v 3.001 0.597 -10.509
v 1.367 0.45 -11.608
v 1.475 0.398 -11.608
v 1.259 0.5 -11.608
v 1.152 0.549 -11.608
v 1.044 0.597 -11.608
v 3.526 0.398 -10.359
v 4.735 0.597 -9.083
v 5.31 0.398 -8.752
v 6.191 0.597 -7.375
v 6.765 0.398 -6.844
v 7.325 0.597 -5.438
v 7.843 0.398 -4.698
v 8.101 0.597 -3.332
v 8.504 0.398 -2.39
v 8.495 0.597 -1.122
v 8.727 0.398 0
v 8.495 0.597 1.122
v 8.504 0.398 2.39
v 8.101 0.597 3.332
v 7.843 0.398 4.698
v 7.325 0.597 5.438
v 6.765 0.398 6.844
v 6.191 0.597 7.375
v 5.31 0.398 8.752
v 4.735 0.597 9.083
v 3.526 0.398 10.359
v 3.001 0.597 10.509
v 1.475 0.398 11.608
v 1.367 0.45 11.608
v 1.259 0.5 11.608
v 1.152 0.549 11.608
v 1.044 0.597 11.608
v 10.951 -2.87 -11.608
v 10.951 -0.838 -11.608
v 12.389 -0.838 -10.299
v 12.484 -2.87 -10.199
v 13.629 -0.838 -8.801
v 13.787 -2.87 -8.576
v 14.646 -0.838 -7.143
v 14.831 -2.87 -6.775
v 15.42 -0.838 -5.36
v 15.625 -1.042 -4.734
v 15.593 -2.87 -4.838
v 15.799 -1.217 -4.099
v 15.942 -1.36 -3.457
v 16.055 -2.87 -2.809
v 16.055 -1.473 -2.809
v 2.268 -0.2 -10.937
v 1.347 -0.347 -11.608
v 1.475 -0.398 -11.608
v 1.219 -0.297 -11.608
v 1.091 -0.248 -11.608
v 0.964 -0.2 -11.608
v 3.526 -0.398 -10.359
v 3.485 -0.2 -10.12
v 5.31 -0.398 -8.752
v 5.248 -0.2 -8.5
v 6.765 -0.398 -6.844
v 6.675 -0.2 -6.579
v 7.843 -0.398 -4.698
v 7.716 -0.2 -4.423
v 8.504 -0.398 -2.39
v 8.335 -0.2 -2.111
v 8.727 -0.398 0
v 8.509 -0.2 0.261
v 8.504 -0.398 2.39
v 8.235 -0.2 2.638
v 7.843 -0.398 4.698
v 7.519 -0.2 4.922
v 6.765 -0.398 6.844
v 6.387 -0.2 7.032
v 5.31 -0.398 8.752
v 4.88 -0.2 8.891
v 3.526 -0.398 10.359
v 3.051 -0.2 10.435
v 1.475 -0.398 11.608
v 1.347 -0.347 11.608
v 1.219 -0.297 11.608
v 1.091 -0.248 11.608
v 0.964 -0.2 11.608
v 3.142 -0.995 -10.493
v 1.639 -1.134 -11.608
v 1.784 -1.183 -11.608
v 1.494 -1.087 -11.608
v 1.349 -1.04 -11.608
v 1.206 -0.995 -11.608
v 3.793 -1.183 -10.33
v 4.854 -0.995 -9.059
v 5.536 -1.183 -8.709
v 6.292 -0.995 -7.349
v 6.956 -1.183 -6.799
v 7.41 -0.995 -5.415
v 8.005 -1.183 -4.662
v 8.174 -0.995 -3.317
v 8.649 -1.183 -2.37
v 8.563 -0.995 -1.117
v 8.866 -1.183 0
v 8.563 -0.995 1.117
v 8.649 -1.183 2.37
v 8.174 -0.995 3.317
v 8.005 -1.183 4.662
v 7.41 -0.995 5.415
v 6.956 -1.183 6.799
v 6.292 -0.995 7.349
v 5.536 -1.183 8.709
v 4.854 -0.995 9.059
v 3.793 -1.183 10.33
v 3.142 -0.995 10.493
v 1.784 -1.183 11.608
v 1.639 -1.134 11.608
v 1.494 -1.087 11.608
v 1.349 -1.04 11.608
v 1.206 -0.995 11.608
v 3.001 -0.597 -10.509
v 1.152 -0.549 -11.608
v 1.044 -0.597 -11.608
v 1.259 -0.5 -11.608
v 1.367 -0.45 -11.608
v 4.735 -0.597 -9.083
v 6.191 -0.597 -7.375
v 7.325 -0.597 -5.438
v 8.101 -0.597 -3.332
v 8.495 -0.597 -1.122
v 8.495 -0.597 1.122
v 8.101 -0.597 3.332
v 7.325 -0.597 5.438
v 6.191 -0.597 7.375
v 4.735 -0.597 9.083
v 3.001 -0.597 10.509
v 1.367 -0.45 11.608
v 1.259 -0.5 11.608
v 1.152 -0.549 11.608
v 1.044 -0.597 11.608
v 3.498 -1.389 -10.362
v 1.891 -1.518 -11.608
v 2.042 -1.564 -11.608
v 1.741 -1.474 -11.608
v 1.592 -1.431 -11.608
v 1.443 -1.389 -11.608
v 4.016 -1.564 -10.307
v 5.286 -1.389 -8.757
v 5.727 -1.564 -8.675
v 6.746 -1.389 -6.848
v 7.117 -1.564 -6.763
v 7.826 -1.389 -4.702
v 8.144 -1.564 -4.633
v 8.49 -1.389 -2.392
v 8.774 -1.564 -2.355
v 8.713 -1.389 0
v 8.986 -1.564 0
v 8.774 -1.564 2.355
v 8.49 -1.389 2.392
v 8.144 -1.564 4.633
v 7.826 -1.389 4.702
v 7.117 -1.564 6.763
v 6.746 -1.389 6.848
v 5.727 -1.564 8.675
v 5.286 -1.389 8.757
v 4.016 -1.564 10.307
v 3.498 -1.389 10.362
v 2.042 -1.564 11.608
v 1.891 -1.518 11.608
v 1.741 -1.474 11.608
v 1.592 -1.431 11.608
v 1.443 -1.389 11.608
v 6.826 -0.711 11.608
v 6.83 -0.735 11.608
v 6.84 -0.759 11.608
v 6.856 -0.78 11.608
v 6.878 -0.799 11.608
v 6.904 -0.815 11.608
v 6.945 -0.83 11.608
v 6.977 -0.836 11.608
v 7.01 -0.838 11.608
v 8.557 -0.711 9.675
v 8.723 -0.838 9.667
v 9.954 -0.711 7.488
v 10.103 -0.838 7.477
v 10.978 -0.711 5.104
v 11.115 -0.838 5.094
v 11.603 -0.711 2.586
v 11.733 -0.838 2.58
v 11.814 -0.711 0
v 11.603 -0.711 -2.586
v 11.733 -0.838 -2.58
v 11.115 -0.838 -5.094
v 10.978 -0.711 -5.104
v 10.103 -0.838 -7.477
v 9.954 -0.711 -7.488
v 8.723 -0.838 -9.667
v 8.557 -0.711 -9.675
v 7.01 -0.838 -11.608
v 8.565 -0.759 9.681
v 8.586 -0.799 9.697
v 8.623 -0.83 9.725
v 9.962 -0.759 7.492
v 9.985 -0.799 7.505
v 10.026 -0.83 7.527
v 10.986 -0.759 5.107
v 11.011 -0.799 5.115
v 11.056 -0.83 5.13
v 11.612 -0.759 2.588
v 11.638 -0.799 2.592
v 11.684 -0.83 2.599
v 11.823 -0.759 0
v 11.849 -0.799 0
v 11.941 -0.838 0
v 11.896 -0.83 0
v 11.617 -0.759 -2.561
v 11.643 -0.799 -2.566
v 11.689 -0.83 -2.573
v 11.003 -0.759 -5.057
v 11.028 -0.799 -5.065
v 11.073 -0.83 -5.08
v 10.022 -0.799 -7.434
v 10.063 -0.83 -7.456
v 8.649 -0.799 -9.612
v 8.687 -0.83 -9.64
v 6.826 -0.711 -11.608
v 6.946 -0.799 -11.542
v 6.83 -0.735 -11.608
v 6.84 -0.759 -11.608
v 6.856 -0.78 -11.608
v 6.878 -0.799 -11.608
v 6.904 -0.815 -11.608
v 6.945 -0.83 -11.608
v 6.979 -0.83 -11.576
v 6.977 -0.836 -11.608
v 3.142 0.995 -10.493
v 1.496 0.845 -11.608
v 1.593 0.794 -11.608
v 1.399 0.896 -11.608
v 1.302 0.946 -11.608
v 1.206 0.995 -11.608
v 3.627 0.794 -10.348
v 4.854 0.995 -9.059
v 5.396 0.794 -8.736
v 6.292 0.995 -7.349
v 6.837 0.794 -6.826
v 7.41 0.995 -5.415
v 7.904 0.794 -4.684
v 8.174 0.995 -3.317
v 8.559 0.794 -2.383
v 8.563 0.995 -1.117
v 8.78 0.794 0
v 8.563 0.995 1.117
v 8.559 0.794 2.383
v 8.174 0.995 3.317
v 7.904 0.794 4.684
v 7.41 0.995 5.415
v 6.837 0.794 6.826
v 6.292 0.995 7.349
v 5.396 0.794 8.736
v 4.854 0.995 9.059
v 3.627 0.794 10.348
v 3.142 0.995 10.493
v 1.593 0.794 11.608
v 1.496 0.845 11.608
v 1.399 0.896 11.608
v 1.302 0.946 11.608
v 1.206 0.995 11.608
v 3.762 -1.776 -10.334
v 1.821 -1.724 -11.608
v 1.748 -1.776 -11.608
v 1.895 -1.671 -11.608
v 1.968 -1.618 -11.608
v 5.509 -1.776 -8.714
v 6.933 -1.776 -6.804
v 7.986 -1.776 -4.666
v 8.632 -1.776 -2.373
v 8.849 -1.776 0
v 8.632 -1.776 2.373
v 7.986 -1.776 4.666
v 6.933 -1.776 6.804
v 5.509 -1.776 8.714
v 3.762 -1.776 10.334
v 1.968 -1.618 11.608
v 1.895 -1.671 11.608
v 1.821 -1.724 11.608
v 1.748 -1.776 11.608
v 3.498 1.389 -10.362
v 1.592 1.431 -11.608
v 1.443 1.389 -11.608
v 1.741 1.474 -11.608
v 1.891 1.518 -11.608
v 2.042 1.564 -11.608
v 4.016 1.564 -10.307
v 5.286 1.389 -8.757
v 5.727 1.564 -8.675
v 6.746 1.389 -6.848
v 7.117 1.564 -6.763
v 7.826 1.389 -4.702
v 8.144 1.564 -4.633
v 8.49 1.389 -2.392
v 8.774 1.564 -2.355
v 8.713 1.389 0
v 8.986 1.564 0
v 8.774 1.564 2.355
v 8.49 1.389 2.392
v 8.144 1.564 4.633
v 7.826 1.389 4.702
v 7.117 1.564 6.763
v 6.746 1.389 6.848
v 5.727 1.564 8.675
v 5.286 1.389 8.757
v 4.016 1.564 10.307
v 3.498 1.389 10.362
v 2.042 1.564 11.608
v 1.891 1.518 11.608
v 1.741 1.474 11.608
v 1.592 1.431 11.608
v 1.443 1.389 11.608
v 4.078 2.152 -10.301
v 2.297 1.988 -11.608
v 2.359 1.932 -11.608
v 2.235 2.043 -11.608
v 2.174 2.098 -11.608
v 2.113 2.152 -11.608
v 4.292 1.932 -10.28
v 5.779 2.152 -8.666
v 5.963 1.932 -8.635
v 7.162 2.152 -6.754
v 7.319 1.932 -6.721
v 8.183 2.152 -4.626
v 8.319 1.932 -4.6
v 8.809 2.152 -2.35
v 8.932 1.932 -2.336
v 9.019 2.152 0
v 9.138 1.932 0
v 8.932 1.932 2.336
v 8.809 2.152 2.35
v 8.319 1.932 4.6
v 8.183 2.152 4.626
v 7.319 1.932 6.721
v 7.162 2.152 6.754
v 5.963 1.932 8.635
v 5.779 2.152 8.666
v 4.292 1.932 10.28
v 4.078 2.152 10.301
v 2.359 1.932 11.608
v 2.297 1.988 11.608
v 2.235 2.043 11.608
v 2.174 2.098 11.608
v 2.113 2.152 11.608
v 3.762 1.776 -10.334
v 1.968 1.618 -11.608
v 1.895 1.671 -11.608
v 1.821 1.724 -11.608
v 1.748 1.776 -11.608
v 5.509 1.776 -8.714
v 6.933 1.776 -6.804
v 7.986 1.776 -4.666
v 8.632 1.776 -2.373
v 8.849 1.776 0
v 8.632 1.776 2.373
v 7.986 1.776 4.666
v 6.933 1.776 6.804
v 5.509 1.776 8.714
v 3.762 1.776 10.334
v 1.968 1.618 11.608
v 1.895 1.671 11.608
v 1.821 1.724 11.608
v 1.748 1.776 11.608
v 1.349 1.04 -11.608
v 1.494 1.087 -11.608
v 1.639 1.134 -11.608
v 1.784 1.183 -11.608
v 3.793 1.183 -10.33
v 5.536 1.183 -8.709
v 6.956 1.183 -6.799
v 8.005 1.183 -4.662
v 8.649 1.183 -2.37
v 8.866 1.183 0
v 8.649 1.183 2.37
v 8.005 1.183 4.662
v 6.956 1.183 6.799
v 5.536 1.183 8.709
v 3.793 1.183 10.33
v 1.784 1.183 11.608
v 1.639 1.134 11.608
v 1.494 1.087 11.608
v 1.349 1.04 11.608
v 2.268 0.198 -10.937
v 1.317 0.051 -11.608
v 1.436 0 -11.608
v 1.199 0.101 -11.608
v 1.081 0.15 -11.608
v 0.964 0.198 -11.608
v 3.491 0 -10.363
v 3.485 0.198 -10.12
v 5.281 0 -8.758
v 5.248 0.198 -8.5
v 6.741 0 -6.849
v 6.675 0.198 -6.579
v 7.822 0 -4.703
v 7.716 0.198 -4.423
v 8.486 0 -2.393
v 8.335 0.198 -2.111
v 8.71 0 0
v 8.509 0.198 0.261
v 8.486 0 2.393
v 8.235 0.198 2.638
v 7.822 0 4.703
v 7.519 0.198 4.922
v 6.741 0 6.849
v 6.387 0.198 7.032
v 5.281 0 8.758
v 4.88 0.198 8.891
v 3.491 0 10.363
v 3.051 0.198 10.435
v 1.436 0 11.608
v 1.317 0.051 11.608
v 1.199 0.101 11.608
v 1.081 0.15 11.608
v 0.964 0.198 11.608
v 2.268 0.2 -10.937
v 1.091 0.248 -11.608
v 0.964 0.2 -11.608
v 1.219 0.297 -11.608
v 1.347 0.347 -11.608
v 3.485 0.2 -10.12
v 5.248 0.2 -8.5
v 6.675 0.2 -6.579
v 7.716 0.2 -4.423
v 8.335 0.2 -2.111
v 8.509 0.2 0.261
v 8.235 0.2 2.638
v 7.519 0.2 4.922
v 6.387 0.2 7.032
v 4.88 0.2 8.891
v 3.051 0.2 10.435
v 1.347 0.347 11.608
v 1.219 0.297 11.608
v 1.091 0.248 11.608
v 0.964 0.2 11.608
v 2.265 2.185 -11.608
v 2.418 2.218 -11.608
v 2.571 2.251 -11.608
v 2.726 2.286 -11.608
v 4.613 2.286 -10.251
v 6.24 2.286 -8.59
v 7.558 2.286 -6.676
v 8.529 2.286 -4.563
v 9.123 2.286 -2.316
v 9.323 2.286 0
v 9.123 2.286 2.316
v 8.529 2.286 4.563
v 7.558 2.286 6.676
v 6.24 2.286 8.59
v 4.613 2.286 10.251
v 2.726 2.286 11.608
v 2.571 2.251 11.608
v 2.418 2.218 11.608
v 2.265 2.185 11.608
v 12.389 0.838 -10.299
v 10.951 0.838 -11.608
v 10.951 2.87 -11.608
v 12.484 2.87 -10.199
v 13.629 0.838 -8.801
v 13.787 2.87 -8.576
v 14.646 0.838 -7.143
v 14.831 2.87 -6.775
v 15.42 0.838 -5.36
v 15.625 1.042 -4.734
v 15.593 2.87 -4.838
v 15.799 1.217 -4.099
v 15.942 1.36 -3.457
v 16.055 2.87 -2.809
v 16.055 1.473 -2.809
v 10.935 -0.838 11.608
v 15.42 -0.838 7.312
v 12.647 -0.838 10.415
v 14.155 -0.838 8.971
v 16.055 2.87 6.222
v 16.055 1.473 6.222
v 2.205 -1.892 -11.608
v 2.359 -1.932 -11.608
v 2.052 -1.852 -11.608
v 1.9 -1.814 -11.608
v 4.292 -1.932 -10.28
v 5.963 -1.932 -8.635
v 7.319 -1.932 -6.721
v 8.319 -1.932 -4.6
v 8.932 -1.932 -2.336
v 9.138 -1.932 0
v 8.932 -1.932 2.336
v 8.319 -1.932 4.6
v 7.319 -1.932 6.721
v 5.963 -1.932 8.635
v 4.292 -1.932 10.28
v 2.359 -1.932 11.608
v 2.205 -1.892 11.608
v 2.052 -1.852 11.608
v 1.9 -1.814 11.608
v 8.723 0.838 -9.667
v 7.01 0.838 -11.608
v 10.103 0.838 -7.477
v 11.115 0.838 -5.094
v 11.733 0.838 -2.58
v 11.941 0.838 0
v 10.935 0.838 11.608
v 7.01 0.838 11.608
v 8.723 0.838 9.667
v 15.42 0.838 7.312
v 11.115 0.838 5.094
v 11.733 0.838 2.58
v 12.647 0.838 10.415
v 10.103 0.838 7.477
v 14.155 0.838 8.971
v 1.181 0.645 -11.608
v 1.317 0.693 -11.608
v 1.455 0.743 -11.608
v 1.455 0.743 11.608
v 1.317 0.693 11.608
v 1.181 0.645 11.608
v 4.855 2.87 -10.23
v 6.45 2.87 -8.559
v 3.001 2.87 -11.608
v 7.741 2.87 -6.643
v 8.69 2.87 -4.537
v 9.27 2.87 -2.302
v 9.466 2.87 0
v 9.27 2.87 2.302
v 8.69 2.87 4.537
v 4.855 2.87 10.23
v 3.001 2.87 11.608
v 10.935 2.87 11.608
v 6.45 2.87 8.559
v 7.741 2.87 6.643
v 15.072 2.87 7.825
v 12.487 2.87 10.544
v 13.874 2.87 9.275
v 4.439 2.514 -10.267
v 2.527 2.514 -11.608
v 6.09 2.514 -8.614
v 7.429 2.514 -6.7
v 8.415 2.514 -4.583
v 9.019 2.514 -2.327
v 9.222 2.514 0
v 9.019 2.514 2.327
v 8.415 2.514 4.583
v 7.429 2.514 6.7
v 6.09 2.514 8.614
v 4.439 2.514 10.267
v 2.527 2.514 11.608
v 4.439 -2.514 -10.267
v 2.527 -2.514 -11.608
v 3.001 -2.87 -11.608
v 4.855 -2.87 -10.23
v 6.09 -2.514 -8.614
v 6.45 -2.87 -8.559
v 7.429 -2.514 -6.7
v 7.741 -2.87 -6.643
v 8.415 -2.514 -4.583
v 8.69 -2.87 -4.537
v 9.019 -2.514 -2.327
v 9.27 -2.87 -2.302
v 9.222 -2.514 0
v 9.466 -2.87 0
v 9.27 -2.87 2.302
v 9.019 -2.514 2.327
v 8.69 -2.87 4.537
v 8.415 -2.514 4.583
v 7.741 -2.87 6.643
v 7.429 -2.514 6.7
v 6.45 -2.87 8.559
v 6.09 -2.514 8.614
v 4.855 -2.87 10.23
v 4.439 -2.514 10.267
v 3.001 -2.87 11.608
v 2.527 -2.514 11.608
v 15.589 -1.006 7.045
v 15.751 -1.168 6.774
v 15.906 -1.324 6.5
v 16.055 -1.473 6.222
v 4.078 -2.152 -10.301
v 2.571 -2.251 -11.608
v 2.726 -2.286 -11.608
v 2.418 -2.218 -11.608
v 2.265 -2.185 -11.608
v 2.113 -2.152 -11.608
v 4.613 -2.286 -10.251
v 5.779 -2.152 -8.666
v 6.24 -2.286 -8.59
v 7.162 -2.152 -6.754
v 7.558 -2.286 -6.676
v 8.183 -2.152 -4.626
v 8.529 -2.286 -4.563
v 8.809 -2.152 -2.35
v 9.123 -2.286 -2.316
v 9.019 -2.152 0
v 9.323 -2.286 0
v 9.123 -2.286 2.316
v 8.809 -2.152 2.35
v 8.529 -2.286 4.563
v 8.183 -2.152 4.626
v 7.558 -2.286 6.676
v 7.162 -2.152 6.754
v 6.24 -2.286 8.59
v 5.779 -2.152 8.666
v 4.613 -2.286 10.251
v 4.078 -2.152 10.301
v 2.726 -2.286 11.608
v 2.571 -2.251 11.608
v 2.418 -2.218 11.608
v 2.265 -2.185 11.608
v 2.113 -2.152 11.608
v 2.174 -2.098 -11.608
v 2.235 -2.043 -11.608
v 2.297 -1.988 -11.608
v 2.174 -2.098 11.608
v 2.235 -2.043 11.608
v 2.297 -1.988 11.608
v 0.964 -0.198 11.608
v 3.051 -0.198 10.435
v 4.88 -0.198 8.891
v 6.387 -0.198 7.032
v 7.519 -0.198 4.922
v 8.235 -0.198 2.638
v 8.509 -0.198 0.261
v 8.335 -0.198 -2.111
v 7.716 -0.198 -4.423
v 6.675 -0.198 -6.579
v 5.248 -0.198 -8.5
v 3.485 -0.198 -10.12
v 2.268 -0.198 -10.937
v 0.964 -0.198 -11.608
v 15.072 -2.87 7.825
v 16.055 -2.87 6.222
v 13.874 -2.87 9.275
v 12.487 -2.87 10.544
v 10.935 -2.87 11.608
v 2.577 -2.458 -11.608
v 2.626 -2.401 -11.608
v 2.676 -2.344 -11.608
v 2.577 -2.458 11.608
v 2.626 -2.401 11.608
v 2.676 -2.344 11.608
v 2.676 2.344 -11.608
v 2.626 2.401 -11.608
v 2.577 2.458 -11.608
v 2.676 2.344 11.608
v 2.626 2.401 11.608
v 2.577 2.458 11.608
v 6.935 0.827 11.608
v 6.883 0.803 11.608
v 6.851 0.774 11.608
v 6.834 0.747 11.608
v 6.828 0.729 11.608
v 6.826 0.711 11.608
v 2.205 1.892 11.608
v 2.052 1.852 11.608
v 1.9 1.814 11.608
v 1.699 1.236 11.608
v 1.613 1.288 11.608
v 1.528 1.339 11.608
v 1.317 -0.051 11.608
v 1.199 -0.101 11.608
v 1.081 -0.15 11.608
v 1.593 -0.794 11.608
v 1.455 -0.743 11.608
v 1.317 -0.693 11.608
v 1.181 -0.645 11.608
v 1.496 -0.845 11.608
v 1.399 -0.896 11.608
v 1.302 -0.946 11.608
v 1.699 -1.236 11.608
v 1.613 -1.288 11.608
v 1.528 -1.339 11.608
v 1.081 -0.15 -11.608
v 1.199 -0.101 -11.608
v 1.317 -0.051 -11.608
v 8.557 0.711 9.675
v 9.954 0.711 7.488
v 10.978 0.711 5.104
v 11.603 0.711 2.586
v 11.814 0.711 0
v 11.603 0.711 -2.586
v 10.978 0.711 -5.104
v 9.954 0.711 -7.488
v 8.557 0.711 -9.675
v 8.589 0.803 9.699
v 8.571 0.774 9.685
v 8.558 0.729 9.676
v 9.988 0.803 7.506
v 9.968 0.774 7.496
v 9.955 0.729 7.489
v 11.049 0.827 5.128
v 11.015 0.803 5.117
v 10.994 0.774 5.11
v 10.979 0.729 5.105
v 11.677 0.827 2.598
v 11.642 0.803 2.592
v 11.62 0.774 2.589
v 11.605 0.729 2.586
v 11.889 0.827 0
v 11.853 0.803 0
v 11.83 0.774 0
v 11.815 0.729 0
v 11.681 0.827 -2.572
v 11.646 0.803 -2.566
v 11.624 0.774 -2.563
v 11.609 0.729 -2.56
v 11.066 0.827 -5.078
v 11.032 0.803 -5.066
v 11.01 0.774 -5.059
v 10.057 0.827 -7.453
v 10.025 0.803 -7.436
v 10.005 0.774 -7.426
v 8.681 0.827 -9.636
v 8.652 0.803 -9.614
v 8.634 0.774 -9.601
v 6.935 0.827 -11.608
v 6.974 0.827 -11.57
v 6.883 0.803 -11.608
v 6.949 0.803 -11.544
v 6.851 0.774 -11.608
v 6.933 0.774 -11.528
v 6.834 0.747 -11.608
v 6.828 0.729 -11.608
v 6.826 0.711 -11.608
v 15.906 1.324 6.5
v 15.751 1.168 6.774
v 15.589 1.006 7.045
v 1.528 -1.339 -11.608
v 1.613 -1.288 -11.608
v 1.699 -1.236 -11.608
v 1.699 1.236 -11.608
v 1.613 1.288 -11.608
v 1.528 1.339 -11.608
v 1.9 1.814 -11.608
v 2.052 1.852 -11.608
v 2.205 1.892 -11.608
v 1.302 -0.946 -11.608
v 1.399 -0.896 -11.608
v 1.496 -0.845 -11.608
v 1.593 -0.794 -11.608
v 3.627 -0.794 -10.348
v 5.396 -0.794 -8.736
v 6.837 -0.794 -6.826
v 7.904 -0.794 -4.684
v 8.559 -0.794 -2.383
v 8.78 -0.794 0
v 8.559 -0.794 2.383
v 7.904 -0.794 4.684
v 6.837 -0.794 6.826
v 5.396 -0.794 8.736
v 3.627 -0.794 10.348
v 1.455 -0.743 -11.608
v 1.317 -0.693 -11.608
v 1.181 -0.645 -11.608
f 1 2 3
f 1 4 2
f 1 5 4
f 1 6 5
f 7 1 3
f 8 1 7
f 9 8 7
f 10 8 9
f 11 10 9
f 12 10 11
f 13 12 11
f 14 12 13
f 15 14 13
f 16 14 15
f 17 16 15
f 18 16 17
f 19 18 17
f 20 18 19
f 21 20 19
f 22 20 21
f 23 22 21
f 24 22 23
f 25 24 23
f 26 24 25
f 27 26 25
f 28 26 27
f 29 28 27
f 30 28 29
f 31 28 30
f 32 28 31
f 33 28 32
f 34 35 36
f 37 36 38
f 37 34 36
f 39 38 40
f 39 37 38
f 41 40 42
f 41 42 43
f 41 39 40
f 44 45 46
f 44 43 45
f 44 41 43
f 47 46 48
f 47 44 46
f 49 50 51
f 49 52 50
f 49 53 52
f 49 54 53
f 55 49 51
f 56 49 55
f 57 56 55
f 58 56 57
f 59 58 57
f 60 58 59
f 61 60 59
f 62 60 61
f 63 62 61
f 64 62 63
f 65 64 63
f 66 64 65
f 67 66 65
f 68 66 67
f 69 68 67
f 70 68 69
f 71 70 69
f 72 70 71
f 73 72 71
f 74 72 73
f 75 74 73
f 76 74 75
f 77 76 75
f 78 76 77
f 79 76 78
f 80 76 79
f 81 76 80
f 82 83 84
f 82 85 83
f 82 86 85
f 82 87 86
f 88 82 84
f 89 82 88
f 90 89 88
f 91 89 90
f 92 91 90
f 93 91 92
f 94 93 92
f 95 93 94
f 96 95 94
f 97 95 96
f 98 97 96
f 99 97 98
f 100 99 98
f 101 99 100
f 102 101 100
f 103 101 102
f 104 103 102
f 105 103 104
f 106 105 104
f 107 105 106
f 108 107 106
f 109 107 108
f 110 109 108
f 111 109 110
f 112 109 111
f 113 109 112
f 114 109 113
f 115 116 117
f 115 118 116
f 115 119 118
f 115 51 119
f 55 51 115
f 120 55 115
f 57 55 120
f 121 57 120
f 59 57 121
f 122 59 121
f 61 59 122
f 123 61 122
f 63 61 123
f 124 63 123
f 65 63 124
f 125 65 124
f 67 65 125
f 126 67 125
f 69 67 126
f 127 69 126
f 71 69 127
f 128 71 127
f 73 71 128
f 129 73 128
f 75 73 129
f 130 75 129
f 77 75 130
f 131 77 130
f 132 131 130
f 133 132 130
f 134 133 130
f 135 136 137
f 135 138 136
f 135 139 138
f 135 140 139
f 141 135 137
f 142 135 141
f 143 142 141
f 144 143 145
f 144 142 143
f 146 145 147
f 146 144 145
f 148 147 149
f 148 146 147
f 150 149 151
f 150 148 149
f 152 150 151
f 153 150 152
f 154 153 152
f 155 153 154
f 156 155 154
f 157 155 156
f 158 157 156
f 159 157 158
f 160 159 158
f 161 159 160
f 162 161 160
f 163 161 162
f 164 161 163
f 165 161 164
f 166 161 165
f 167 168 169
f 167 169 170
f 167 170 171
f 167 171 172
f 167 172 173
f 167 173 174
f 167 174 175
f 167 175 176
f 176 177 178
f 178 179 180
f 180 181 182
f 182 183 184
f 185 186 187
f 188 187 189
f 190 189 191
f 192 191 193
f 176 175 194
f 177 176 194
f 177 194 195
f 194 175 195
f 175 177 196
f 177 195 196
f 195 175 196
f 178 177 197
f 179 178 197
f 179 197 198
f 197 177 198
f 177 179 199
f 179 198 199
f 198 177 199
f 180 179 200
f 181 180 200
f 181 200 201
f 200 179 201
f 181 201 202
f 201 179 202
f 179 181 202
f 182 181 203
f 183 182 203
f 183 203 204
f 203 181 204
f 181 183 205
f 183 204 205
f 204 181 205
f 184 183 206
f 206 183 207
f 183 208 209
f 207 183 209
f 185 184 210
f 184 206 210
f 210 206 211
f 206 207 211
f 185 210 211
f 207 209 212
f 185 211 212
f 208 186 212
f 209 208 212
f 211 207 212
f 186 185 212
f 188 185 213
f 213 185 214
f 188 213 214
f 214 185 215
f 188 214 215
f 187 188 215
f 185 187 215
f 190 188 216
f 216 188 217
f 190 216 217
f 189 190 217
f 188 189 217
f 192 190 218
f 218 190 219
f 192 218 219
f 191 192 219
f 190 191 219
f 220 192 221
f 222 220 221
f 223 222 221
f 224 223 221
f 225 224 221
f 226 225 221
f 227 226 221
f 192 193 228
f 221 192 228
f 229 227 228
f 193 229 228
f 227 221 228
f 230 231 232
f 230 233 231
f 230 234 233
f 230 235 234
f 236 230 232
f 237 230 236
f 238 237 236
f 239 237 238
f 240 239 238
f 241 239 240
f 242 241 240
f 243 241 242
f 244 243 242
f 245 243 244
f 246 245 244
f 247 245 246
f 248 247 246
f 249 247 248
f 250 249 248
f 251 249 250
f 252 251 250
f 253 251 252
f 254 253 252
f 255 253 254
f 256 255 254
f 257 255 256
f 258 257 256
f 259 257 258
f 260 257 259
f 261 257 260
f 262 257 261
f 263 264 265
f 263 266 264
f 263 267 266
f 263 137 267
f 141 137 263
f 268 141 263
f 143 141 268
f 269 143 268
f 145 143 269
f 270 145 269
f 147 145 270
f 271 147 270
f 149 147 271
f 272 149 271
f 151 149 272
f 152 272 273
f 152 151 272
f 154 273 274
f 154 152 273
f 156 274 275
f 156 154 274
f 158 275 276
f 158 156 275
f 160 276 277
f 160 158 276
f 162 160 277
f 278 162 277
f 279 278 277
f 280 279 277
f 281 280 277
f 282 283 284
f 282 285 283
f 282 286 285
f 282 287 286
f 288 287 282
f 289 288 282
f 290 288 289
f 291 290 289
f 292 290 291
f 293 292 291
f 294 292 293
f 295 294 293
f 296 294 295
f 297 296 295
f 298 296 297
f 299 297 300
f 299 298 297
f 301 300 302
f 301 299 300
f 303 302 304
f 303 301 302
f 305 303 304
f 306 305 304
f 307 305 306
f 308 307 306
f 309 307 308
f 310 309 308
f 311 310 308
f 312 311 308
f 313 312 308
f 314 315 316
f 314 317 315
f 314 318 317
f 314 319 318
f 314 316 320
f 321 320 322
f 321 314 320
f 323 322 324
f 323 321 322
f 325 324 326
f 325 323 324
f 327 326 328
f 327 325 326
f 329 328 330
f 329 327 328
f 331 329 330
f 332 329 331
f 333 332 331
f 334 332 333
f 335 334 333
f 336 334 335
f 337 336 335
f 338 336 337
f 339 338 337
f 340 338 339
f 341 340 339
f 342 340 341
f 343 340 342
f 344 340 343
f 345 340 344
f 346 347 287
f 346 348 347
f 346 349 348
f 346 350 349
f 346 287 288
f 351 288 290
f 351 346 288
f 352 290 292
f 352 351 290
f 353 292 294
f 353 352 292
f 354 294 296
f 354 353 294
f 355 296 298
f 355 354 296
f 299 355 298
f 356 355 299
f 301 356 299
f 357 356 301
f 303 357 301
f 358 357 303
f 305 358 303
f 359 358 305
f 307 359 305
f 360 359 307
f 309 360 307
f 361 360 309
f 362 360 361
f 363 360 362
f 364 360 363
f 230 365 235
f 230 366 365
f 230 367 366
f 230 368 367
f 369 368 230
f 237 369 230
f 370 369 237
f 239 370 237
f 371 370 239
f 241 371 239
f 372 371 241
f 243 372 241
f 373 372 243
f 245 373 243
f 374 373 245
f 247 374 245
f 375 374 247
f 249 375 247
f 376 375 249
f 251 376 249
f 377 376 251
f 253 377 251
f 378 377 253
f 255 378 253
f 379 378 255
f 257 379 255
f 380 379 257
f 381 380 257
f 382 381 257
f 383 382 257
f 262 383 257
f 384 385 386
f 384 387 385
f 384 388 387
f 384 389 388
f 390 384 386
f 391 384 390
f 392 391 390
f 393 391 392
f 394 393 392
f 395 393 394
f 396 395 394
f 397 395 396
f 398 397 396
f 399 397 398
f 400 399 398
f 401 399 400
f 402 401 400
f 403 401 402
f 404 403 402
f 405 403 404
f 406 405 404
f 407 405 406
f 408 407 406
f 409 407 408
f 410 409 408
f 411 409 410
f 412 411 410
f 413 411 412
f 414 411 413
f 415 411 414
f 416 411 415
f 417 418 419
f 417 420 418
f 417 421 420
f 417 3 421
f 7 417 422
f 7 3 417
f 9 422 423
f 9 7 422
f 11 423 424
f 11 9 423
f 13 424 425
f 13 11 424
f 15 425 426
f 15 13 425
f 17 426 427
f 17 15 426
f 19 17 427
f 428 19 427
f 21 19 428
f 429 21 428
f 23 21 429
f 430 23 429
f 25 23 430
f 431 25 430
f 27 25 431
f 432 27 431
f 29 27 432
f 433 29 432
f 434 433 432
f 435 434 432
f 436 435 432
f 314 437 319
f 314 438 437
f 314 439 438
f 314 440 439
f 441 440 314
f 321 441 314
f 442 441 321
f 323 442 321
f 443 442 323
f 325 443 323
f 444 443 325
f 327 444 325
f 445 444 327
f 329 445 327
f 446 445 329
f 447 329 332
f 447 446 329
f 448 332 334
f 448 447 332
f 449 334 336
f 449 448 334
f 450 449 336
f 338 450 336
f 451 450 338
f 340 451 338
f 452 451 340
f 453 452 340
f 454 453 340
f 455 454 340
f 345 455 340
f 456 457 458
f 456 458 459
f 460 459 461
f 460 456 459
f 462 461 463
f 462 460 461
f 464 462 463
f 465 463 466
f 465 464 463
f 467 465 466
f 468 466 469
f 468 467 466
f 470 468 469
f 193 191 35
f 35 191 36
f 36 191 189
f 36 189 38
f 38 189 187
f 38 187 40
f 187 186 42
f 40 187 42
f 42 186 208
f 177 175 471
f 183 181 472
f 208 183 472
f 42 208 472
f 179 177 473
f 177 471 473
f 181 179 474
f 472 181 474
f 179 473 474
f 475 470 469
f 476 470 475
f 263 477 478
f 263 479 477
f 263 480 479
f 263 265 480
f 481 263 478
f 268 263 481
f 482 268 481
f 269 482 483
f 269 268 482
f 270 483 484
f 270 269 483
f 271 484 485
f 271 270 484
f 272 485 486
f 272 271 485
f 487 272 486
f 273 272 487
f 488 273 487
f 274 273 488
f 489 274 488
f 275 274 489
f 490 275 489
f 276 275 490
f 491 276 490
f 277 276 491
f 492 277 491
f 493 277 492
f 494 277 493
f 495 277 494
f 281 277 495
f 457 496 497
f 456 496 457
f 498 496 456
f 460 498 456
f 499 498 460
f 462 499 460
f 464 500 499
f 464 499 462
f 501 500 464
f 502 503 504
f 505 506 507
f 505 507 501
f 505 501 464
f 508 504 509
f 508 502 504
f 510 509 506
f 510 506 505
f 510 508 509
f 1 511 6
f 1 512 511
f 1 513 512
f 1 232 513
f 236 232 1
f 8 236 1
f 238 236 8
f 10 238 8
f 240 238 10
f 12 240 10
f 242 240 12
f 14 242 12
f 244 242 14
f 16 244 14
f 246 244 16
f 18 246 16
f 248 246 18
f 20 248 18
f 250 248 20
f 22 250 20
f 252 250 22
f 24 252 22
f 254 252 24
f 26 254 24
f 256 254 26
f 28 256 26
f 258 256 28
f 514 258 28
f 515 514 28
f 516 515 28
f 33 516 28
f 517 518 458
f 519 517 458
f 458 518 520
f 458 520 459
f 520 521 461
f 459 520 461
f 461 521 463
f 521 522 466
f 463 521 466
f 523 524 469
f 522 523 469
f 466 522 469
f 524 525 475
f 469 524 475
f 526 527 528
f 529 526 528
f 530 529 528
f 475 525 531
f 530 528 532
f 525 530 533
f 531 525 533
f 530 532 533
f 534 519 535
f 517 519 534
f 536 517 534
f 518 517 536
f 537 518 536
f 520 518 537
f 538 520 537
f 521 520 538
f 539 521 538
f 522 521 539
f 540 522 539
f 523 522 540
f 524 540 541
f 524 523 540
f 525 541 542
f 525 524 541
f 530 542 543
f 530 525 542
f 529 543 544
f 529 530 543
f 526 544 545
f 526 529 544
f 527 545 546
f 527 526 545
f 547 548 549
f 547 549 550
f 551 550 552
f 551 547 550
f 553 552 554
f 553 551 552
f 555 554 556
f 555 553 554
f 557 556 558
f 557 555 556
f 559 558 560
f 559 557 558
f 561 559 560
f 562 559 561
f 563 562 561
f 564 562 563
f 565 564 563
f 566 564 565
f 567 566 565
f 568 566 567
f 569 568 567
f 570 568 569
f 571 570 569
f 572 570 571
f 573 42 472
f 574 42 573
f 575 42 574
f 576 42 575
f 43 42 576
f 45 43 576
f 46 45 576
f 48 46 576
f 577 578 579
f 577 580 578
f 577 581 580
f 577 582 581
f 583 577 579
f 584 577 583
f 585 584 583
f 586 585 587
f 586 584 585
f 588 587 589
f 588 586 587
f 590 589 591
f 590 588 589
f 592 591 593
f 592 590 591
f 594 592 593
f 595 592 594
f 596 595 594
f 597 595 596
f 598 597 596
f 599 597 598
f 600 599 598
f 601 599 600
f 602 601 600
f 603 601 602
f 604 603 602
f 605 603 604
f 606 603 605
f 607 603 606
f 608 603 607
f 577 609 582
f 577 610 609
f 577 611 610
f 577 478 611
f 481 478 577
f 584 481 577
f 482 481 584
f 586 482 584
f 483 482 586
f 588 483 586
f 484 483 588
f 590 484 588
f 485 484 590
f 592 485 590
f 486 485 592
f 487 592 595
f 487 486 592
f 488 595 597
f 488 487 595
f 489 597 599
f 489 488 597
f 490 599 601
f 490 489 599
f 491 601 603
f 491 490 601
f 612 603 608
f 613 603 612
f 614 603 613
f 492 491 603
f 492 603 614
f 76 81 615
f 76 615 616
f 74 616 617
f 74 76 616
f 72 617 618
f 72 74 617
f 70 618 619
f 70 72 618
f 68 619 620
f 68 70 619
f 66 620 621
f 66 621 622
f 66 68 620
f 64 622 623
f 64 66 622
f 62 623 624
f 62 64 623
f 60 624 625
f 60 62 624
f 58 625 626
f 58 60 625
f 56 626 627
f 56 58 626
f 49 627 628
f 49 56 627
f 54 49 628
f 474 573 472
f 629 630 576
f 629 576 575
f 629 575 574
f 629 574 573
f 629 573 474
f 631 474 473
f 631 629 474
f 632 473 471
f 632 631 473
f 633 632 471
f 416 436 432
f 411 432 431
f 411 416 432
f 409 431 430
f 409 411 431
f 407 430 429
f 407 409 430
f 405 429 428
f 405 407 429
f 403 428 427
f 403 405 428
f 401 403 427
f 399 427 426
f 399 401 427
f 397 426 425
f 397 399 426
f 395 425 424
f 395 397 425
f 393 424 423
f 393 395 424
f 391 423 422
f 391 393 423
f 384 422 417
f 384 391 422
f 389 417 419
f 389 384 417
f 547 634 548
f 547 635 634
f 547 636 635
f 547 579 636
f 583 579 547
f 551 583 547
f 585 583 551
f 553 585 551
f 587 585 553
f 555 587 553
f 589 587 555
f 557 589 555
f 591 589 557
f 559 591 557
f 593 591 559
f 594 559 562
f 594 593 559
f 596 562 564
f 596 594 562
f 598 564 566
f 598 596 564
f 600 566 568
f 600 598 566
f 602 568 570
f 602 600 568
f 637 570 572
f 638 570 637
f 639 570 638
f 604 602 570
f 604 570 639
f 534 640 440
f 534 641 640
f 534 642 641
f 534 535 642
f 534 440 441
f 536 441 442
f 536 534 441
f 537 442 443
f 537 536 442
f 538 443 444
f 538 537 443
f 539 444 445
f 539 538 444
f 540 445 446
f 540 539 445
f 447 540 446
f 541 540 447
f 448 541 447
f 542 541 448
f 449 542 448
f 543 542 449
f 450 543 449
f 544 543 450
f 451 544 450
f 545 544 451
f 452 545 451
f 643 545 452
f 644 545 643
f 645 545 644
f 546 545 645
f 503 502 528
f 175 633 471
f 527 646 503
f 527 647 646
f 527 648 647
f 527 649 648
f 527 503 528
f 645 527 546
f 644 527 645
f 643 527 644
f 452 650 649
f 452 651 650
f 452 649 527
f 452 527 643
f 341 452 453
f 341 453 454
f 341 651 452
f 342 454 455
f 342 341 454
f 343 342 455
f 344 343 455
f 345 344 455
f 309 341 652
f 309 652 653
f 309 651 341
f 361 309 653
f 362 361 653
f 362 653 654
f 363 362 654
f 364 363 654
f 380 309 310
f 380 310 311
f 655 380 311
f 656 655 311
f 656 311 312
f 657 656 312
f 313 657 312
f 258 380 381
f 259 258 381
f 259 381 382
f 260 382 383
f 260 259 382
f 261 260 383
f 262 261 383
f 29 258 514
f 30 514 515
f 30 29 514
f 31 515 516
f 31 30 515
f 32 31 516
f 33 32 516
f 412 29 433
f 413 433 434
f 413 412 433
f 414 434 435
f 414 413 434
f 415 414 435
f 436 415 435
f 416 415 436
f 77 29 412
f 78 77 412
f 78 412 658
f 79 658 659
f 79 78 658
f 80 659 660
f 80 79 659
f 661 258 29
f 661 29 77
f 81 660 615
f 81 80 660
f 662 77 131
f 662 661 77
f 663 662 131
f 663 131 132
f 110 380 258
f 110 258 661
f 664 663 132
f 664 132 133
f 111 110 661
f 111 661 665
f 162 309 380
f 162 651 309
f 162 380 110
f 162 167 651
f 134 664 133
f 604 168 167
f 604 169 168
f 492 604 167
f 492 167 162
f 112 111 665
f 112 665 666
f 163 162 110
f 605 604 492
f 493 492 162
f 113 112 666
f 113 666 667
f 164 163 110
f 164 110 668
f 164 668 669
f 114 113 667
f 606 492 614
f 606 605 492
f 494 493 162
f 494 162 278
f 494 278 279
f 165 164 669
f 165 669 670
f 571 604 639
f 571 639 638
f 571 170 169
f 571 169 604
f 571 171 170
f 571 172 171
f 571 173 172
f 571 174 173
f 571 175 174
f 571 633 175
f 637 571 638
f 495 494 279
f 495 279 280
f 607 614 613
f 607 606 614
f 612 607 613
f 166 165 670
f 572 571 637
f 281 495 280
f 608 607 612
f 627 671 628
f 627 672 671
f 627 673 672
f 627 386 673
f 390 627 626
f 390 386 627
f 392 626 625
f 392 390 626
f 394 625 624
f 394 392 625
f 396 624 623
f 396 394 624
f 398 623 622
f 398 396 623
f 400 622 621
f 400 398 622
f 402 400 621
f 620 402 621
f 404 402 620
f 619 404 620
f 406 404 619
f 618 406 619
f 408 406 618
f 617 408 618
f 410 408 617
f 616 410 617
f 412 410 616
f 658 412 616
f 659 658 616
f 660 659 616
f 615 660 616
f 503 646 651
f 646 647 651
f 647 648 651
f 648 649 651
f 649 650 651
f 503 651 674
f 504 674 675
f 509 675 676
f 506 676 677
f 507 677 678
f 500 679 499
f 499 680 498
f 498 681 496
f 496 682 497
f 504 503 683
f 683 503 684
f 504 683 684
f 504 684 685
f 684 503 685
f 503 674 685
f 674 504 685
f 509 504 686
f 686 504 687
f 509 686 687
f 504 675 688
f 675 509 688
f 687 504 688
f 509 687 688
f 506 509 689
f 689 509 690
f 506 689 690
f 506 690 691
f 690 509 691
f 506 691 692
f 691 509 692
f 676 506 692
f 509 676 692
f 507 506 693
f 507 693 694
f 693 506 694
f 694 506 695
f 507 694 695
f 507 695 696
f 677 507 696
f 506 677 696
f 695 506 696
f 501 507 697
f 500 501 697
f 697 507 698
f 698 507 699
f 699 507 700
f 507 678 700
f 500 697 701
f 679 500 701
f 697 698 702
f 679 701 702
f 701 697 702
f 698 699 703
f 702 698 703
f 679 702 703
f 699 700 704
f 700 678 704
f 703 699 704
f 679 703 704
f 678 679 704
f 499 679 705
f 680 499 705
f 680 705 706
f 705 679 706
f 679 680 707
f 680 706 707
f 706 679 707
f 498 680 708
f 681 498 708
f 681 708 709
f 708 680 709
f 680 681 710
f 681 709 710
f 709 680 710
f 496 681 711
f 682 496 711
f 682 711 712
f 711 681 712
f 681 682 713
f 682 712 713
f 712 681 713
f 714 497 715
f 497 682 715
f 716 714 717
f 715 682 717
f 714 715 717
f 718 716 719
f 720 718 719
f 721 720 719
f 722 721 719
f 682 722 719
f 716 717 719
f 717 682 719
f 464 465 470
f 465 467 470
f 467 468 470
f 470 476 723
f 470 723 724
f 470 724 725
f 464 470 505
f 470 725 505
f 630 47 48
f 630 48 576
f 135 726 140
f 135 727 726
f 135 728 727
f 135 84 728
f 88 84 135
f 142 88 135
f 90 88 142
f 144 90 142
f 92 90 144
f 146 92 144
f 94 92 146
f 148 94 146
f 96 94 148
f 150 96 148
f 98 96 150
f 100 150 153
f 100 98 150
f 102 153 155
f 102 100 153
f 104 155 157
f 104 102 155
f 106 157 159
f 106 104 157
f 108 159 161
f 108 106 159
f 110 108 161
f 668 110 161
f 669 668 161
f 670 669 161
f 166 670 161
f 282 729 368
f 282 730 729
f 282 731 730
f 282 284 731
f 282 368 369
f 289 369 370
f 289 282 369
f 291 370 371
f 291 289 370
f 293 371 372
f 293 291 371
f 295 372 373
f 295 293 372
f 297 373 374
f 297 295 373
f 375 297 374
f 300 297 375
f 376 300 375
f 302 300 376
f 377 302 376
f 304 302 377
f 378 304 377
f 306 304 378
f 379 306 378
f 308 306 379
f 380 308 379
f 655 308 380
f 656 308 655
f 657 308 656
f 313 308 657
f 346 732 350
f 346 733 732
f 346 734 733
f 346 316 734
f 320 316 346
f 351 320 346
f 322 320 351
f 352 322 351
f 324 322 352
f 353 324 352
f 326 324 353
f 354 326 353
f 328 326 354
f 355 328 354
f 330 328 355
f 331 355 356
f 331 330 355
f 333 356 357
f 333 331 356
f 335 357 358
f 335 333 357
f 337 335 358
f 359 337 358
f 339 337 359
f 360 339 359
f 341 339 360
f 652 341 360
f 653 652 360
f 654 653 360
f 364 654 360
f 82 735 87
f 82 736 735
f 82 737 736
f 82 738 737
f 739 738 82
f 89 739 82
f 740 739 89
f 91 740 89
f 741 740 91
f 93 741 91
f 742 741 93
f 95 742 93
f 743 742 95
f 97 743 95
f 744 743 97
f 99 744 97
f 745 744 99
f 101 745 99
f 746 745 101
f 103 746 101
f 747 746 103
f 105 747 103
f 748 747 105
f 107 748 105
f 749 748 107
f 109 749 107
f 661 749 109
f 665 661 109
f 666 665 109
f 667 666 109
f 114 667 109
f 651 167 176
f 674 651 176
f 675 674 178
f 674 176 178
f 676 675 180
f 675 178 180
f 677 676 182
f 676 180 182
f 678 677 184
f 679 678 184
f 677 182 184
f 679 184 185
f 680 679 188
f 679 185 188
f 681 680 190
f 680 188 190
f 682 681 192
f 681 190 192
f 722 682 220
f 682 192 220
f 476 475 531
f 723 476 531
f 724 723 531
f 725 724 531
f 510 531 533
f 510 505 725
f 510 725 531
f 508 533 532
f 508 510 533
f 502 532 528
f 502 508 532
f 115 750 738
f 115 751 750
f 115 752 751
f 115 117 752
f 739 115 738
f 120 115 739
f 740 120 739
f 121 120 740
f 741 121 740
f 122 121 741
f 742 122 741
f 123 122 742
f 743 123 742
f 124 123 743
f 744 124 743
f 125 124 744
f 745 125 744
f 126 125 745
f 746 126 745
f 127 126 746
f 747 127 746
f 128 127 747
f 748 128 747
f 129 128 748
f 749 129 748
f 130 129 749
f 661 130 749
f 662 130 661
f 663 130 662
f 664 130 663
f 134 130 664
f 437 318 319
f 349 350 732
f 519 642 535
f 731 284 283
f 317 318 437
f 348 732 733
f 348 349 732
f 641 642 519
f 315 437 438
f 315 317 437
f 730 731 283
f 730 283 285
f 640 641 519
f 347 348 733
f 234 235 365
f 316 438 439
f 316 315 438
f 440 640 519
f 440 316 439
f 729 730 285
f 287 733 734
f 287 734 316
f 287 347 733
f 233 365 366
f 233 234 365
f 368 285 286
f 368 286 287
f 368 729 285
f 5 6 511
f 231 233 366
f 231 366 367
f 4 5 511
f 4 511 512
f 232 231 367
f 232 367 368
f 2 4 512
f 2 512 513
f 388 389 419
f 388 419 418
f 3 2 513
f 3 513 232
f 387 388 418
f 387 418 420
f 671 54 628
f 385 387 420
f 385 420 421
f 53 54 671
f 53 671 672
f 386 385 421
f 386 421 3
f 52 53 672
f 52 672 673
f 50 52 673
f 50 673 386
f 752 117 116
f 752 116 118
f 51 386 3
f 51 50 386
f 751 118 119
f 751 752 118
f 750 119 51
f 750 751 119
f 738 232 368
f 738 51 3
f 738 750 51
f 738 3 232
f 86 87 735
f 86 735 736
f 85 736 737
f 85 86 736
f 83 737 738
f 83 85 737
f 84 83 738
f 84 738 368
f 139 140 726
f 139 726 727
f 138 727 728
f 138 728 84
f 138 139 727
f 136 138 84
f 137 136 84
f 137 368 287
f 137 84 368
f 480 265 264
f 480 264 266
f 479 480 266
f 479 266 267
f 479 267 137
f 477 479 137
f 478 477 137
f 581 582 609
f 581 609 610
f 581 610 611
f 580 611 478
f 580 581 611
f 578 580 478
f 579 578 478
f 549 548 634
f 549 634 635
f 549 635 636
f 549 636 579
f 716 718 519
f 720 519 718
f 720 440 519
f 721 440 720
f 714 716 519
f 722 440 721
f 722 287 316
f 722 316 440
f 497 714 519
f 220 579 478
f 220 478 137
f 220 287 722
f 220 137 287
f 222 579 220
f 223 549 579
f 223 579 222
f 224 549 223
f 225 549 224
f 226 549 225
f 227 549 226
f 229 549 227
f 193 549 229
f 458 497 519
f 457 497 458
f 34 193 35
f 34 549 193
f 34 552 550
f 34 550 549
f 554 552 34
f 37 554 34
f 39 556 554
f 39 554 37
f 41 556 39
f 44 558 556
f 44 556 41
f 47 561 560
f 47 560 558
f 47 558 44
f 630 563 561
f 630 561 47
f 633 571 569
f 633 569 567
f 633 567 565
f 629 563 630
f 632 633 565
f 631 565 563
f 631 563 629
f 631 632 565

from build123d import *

# Parameters (mm, degrees)
F1_DEPTH = 2.8702
F3_DEPTH = 0.8382
F4_R     = 0.127
F7_SIZE  = 0.635


with BuildPart() as f1:
    # F0 (on Front) → F1 (new body, symmetric)
    with BuildSketch(Plane.XZ):
        with BuildLine():
            Line((10.935379, 11.6078), (0.964201, 11.6078))
            ThreePointArc((0.964201, 11.6078), (8.511631, 0), (0.964201, -11.6078))
            Line((0.964201, -11.6078), (10.951463, -11.6078))
            ThreePointArc((10.951463, -11.6078), (14.342647, -7.694951), (16.055431, -2.808553))
            Line((16.055431, -2.808553), (16.055431, 6.221704))
            ThreePointArc((16.055431, 6.221704), (13.874424, 9.275049), (10.935379, 11.6078))
        make_face()
    extrude(amount=F1_DEPTH, both=True)

    # F2 (on Front) → F3 (cut, symmetric)
    with BuildSketch(Plane.XZ):
        with BuildLine():
            ThreePointArc((6.826302, 11.6078), (11.813631, 0), (6.826302, -11.6078))
            Line((6.826302, -11.6078), (10.951463, -11.6078))
            ThreePointArc((10.951463, -11.6078), (14.342647, -7.694951), (16.055431, -2.808553))
            Line((16.055431, -2.808553), (16.055431, 6.221704))
            ThreePointArc((16.055431, 6.221704), (13.874424, 9.275049), (10.935379, 11.6078))
            Line((10.935379, 11.6078), (6.826302, 11.6078))
        make_face()
    extrude(amount=F3_DEPTH, both=True, mode=Mode.SUBTRACT)

    # F4
    f4_edges = [f1.edges().sort_by_distance(p)[0] for p in [
        (11.813631, 0.8382, 0),
        (11.813631, -0.8382, 0),
    ]]
    fillet(f4_edges, radius=F4_R)

    # F5 (on Top) → F6 (revolve, cut)
    with BuildSketch(Plane.XY):
        with BuildLine():
            Line((9.46572, 2.8702), (0.964201, 2.8702))
            Line((0.964201, 2.8702), (0.964201, -2.8702))
            Line((0.964201, -2.8702), (9.46572, -2.8702))
            ThreePointArc((9.46572, -2.8702), (9.339917, -2.69481), (9.222168, -2.513915))
            ThreePointArc((9.222168, -2.513915), (9.116906, -2.335376), (9.01949, -2.152438))
            ThreePointArc((9.01949, -2.152438), (8.930418, -1.966139), (8.849484, -1.776164))
            ThreePointArc((8.849484, -1.776164), (8.777234, -1.583993), (8.713312, -1.388894))
            ThreePointArc((8.713312, -1.388894), (8.658256, -1.192864), (8.611607, -0.994664))
            ThreePointArc((8.611607, -0.994664), (8.573786, -0.796647), (8.544357, -0.59721))
            ThreePointArc((8.544357, -0.59721), (8.52352, -0.398479), (8.511016, -0.19905))
            ThreePointArc((8.511016, -0.19905), (8.506865, 0), (8.511016, 0.19905))
            ThreePointArc((8.511016, 0.19905), (8.52352, 0.398479), (8.544357, 0.59721))
            ThreePointArc((8.544357, 0.59721), (8.573786, 0.796647), (8.611607, 0.994664))
            ThreePointArc((8.611607, 0.994664), (8.658256, 1.192864), (8.713312, 1.388894))
            ThreePointArc((8.713312, 1.388894), (8.777234, 1.583993), (8.849484, 1.776164))
            ThreePointArc((8.849484, 1.776164), (8.930418, 1.966139), (9.01949, 2.152438))
            ThreePointArc((9.01949, 2.152438), (9.116906, 2.335376), (9.222168, 2.513915))
            ThreePointArc((9.222168, 2.513915), (9.339917, 2.69481), (9.46572, 2.8702))
        make_face()
        with BuildLine():
            Line((9.322597, 2.286), (9.222168, 2.513915))
            ThreePointArc((9.222168, 2.513915), (9.116906, 2.335376), (9.01949, 2.152438))
            Line((9.01949, 2.152438), (9.322597, 2.286))
        make_face()
        with BuildLine():
            Line((9.138426, 1.932211), (9.01949, 2.152438))
            ThreePointArc((9.01949, 2.152438), (8.930418, 1.966139), (8.849484, 1.776164))
            Line((8.849484, 1.776164), (9.138426, 1.932211))
        make_face()
        with BuildLine():
            ThreePointArc((9.01949, -2.152438), (9.116906, -2.335376), (9.222168, -2.513915))
            Line((9.222168, -2.513915), (9.322597, -2.286))
            Line((9.322597, -2.286), (9.01949, -2.152438))
        make_face()
        with BuildLine():
            Line((8.985791, 1.563716), (8.849484, 1.776164))
            ThreePointArc((8.849484, 1.776164), (8.777234, 1.583993), (8.713312, 1.388894))
            Line((8.713312, 1.388894), (8.985791, 1.563716))
        make_face()
        with BuildLine():
            ThreePointArc((8.849484, -1.776164), (8.930418, -1.966139), (9.01949, -2.152438))
            Line((9.01949, -2.152438), (9.138426, -1.932211))
            Line((9.138426, -1.932211), (8.849484, -1.776164))
        make_face()
        with BuildLine():
            Line((8.865852, 1.183321), (8.713312, 1.388894))
            ThreePointArc((8.713312, 1.388894), (8.658256, 1.192864), (8.611607, 0.994664))
            Line((8.611607, 0.994664), (8.865852, 1.183321))
        make_face()
        with BuildLine():
            ThreePointArc((8.713312, -1.388894), (8.777234, -1.583993), (8.849484, -1.776164))
            Line((8.849484, -1.776164), (8.985791, -1.563716))
            Line((8.985791, -1.563716), (8.713312, -1.388894))
        make_face()
        with BuildLine():
            Line((8.779524, 0.793919), (8.611607, 0.994664))
            ThreePointArc((8.611607, 0.994664), (8.573786, 0.796647), (8.544357, 0.59721))
            Line((8.544357, 0.59721), (8.779524, 0.793919))
        make_face()
        with BuildLine():
            ThreePointArc((8.611607, -0.994664), (8.658256, -1.192864), (8.713312, -1.388894))
            Line((8.713312, -1.388894), (8.865852, -1.183321))
            Line((8.865852, -1.183321), (8.611607, -0.994664))
        make_face()
        with BuildLine():
            Line((8.727463, 0.398476), (8.544357, 0.59721))
            ThreePointArc((8.544357, 0.59721), (8.52352, 0.398479), (8.511016, 0.19905))
            Line((8.511016, 0.19905), (8.727463, 0.398476))
        make_face()
        with BuildLine():
            ThreePointArc((8.544357, -0.59721), (8.573786, -0.796647), (8.611607, -0.994664))
            Line((8.611607, -0.994664), (8.779524, -0.793919))
            Line((8.779524, -0.793919), (8.544357, -0.59721))
        make_face()
        with BuildLine():
            Line((8.710065, 0), (8.511016, 0.19905))
            ThreePointArc((8.511016, 0.19905), (8.506865, 0), (8.511016, -0.19905))
            Line((8.511016, -0.19905), (8.710065, 0))
        make_face()
        with BuildLine():
            ThreePointArc((8.511016, -0.19905), (8.52352, -0.398479), (8.544357, -0.59721))
            Line((8.544357, -0.59721), (8.727463, -0.398476))
            Line((8.727463, -0.398476), (8.511016, -0.19905))
        make_face()
    revolve(axis=Axis((-4.188369, -0.221392, 0), (0, -1, 0)), mode=Mode.SUBTRACT)

    # F7
    f7_edges = [f1.edges().sort_by_distance(p)[0] for p in [
        (16.055431, -0.8382, 1.706576),
        (16.055431, 0.8382, 1.706576),
    ]]
    chamfer(f7_edges, length=F7_SIZE)


solid = f1.part
